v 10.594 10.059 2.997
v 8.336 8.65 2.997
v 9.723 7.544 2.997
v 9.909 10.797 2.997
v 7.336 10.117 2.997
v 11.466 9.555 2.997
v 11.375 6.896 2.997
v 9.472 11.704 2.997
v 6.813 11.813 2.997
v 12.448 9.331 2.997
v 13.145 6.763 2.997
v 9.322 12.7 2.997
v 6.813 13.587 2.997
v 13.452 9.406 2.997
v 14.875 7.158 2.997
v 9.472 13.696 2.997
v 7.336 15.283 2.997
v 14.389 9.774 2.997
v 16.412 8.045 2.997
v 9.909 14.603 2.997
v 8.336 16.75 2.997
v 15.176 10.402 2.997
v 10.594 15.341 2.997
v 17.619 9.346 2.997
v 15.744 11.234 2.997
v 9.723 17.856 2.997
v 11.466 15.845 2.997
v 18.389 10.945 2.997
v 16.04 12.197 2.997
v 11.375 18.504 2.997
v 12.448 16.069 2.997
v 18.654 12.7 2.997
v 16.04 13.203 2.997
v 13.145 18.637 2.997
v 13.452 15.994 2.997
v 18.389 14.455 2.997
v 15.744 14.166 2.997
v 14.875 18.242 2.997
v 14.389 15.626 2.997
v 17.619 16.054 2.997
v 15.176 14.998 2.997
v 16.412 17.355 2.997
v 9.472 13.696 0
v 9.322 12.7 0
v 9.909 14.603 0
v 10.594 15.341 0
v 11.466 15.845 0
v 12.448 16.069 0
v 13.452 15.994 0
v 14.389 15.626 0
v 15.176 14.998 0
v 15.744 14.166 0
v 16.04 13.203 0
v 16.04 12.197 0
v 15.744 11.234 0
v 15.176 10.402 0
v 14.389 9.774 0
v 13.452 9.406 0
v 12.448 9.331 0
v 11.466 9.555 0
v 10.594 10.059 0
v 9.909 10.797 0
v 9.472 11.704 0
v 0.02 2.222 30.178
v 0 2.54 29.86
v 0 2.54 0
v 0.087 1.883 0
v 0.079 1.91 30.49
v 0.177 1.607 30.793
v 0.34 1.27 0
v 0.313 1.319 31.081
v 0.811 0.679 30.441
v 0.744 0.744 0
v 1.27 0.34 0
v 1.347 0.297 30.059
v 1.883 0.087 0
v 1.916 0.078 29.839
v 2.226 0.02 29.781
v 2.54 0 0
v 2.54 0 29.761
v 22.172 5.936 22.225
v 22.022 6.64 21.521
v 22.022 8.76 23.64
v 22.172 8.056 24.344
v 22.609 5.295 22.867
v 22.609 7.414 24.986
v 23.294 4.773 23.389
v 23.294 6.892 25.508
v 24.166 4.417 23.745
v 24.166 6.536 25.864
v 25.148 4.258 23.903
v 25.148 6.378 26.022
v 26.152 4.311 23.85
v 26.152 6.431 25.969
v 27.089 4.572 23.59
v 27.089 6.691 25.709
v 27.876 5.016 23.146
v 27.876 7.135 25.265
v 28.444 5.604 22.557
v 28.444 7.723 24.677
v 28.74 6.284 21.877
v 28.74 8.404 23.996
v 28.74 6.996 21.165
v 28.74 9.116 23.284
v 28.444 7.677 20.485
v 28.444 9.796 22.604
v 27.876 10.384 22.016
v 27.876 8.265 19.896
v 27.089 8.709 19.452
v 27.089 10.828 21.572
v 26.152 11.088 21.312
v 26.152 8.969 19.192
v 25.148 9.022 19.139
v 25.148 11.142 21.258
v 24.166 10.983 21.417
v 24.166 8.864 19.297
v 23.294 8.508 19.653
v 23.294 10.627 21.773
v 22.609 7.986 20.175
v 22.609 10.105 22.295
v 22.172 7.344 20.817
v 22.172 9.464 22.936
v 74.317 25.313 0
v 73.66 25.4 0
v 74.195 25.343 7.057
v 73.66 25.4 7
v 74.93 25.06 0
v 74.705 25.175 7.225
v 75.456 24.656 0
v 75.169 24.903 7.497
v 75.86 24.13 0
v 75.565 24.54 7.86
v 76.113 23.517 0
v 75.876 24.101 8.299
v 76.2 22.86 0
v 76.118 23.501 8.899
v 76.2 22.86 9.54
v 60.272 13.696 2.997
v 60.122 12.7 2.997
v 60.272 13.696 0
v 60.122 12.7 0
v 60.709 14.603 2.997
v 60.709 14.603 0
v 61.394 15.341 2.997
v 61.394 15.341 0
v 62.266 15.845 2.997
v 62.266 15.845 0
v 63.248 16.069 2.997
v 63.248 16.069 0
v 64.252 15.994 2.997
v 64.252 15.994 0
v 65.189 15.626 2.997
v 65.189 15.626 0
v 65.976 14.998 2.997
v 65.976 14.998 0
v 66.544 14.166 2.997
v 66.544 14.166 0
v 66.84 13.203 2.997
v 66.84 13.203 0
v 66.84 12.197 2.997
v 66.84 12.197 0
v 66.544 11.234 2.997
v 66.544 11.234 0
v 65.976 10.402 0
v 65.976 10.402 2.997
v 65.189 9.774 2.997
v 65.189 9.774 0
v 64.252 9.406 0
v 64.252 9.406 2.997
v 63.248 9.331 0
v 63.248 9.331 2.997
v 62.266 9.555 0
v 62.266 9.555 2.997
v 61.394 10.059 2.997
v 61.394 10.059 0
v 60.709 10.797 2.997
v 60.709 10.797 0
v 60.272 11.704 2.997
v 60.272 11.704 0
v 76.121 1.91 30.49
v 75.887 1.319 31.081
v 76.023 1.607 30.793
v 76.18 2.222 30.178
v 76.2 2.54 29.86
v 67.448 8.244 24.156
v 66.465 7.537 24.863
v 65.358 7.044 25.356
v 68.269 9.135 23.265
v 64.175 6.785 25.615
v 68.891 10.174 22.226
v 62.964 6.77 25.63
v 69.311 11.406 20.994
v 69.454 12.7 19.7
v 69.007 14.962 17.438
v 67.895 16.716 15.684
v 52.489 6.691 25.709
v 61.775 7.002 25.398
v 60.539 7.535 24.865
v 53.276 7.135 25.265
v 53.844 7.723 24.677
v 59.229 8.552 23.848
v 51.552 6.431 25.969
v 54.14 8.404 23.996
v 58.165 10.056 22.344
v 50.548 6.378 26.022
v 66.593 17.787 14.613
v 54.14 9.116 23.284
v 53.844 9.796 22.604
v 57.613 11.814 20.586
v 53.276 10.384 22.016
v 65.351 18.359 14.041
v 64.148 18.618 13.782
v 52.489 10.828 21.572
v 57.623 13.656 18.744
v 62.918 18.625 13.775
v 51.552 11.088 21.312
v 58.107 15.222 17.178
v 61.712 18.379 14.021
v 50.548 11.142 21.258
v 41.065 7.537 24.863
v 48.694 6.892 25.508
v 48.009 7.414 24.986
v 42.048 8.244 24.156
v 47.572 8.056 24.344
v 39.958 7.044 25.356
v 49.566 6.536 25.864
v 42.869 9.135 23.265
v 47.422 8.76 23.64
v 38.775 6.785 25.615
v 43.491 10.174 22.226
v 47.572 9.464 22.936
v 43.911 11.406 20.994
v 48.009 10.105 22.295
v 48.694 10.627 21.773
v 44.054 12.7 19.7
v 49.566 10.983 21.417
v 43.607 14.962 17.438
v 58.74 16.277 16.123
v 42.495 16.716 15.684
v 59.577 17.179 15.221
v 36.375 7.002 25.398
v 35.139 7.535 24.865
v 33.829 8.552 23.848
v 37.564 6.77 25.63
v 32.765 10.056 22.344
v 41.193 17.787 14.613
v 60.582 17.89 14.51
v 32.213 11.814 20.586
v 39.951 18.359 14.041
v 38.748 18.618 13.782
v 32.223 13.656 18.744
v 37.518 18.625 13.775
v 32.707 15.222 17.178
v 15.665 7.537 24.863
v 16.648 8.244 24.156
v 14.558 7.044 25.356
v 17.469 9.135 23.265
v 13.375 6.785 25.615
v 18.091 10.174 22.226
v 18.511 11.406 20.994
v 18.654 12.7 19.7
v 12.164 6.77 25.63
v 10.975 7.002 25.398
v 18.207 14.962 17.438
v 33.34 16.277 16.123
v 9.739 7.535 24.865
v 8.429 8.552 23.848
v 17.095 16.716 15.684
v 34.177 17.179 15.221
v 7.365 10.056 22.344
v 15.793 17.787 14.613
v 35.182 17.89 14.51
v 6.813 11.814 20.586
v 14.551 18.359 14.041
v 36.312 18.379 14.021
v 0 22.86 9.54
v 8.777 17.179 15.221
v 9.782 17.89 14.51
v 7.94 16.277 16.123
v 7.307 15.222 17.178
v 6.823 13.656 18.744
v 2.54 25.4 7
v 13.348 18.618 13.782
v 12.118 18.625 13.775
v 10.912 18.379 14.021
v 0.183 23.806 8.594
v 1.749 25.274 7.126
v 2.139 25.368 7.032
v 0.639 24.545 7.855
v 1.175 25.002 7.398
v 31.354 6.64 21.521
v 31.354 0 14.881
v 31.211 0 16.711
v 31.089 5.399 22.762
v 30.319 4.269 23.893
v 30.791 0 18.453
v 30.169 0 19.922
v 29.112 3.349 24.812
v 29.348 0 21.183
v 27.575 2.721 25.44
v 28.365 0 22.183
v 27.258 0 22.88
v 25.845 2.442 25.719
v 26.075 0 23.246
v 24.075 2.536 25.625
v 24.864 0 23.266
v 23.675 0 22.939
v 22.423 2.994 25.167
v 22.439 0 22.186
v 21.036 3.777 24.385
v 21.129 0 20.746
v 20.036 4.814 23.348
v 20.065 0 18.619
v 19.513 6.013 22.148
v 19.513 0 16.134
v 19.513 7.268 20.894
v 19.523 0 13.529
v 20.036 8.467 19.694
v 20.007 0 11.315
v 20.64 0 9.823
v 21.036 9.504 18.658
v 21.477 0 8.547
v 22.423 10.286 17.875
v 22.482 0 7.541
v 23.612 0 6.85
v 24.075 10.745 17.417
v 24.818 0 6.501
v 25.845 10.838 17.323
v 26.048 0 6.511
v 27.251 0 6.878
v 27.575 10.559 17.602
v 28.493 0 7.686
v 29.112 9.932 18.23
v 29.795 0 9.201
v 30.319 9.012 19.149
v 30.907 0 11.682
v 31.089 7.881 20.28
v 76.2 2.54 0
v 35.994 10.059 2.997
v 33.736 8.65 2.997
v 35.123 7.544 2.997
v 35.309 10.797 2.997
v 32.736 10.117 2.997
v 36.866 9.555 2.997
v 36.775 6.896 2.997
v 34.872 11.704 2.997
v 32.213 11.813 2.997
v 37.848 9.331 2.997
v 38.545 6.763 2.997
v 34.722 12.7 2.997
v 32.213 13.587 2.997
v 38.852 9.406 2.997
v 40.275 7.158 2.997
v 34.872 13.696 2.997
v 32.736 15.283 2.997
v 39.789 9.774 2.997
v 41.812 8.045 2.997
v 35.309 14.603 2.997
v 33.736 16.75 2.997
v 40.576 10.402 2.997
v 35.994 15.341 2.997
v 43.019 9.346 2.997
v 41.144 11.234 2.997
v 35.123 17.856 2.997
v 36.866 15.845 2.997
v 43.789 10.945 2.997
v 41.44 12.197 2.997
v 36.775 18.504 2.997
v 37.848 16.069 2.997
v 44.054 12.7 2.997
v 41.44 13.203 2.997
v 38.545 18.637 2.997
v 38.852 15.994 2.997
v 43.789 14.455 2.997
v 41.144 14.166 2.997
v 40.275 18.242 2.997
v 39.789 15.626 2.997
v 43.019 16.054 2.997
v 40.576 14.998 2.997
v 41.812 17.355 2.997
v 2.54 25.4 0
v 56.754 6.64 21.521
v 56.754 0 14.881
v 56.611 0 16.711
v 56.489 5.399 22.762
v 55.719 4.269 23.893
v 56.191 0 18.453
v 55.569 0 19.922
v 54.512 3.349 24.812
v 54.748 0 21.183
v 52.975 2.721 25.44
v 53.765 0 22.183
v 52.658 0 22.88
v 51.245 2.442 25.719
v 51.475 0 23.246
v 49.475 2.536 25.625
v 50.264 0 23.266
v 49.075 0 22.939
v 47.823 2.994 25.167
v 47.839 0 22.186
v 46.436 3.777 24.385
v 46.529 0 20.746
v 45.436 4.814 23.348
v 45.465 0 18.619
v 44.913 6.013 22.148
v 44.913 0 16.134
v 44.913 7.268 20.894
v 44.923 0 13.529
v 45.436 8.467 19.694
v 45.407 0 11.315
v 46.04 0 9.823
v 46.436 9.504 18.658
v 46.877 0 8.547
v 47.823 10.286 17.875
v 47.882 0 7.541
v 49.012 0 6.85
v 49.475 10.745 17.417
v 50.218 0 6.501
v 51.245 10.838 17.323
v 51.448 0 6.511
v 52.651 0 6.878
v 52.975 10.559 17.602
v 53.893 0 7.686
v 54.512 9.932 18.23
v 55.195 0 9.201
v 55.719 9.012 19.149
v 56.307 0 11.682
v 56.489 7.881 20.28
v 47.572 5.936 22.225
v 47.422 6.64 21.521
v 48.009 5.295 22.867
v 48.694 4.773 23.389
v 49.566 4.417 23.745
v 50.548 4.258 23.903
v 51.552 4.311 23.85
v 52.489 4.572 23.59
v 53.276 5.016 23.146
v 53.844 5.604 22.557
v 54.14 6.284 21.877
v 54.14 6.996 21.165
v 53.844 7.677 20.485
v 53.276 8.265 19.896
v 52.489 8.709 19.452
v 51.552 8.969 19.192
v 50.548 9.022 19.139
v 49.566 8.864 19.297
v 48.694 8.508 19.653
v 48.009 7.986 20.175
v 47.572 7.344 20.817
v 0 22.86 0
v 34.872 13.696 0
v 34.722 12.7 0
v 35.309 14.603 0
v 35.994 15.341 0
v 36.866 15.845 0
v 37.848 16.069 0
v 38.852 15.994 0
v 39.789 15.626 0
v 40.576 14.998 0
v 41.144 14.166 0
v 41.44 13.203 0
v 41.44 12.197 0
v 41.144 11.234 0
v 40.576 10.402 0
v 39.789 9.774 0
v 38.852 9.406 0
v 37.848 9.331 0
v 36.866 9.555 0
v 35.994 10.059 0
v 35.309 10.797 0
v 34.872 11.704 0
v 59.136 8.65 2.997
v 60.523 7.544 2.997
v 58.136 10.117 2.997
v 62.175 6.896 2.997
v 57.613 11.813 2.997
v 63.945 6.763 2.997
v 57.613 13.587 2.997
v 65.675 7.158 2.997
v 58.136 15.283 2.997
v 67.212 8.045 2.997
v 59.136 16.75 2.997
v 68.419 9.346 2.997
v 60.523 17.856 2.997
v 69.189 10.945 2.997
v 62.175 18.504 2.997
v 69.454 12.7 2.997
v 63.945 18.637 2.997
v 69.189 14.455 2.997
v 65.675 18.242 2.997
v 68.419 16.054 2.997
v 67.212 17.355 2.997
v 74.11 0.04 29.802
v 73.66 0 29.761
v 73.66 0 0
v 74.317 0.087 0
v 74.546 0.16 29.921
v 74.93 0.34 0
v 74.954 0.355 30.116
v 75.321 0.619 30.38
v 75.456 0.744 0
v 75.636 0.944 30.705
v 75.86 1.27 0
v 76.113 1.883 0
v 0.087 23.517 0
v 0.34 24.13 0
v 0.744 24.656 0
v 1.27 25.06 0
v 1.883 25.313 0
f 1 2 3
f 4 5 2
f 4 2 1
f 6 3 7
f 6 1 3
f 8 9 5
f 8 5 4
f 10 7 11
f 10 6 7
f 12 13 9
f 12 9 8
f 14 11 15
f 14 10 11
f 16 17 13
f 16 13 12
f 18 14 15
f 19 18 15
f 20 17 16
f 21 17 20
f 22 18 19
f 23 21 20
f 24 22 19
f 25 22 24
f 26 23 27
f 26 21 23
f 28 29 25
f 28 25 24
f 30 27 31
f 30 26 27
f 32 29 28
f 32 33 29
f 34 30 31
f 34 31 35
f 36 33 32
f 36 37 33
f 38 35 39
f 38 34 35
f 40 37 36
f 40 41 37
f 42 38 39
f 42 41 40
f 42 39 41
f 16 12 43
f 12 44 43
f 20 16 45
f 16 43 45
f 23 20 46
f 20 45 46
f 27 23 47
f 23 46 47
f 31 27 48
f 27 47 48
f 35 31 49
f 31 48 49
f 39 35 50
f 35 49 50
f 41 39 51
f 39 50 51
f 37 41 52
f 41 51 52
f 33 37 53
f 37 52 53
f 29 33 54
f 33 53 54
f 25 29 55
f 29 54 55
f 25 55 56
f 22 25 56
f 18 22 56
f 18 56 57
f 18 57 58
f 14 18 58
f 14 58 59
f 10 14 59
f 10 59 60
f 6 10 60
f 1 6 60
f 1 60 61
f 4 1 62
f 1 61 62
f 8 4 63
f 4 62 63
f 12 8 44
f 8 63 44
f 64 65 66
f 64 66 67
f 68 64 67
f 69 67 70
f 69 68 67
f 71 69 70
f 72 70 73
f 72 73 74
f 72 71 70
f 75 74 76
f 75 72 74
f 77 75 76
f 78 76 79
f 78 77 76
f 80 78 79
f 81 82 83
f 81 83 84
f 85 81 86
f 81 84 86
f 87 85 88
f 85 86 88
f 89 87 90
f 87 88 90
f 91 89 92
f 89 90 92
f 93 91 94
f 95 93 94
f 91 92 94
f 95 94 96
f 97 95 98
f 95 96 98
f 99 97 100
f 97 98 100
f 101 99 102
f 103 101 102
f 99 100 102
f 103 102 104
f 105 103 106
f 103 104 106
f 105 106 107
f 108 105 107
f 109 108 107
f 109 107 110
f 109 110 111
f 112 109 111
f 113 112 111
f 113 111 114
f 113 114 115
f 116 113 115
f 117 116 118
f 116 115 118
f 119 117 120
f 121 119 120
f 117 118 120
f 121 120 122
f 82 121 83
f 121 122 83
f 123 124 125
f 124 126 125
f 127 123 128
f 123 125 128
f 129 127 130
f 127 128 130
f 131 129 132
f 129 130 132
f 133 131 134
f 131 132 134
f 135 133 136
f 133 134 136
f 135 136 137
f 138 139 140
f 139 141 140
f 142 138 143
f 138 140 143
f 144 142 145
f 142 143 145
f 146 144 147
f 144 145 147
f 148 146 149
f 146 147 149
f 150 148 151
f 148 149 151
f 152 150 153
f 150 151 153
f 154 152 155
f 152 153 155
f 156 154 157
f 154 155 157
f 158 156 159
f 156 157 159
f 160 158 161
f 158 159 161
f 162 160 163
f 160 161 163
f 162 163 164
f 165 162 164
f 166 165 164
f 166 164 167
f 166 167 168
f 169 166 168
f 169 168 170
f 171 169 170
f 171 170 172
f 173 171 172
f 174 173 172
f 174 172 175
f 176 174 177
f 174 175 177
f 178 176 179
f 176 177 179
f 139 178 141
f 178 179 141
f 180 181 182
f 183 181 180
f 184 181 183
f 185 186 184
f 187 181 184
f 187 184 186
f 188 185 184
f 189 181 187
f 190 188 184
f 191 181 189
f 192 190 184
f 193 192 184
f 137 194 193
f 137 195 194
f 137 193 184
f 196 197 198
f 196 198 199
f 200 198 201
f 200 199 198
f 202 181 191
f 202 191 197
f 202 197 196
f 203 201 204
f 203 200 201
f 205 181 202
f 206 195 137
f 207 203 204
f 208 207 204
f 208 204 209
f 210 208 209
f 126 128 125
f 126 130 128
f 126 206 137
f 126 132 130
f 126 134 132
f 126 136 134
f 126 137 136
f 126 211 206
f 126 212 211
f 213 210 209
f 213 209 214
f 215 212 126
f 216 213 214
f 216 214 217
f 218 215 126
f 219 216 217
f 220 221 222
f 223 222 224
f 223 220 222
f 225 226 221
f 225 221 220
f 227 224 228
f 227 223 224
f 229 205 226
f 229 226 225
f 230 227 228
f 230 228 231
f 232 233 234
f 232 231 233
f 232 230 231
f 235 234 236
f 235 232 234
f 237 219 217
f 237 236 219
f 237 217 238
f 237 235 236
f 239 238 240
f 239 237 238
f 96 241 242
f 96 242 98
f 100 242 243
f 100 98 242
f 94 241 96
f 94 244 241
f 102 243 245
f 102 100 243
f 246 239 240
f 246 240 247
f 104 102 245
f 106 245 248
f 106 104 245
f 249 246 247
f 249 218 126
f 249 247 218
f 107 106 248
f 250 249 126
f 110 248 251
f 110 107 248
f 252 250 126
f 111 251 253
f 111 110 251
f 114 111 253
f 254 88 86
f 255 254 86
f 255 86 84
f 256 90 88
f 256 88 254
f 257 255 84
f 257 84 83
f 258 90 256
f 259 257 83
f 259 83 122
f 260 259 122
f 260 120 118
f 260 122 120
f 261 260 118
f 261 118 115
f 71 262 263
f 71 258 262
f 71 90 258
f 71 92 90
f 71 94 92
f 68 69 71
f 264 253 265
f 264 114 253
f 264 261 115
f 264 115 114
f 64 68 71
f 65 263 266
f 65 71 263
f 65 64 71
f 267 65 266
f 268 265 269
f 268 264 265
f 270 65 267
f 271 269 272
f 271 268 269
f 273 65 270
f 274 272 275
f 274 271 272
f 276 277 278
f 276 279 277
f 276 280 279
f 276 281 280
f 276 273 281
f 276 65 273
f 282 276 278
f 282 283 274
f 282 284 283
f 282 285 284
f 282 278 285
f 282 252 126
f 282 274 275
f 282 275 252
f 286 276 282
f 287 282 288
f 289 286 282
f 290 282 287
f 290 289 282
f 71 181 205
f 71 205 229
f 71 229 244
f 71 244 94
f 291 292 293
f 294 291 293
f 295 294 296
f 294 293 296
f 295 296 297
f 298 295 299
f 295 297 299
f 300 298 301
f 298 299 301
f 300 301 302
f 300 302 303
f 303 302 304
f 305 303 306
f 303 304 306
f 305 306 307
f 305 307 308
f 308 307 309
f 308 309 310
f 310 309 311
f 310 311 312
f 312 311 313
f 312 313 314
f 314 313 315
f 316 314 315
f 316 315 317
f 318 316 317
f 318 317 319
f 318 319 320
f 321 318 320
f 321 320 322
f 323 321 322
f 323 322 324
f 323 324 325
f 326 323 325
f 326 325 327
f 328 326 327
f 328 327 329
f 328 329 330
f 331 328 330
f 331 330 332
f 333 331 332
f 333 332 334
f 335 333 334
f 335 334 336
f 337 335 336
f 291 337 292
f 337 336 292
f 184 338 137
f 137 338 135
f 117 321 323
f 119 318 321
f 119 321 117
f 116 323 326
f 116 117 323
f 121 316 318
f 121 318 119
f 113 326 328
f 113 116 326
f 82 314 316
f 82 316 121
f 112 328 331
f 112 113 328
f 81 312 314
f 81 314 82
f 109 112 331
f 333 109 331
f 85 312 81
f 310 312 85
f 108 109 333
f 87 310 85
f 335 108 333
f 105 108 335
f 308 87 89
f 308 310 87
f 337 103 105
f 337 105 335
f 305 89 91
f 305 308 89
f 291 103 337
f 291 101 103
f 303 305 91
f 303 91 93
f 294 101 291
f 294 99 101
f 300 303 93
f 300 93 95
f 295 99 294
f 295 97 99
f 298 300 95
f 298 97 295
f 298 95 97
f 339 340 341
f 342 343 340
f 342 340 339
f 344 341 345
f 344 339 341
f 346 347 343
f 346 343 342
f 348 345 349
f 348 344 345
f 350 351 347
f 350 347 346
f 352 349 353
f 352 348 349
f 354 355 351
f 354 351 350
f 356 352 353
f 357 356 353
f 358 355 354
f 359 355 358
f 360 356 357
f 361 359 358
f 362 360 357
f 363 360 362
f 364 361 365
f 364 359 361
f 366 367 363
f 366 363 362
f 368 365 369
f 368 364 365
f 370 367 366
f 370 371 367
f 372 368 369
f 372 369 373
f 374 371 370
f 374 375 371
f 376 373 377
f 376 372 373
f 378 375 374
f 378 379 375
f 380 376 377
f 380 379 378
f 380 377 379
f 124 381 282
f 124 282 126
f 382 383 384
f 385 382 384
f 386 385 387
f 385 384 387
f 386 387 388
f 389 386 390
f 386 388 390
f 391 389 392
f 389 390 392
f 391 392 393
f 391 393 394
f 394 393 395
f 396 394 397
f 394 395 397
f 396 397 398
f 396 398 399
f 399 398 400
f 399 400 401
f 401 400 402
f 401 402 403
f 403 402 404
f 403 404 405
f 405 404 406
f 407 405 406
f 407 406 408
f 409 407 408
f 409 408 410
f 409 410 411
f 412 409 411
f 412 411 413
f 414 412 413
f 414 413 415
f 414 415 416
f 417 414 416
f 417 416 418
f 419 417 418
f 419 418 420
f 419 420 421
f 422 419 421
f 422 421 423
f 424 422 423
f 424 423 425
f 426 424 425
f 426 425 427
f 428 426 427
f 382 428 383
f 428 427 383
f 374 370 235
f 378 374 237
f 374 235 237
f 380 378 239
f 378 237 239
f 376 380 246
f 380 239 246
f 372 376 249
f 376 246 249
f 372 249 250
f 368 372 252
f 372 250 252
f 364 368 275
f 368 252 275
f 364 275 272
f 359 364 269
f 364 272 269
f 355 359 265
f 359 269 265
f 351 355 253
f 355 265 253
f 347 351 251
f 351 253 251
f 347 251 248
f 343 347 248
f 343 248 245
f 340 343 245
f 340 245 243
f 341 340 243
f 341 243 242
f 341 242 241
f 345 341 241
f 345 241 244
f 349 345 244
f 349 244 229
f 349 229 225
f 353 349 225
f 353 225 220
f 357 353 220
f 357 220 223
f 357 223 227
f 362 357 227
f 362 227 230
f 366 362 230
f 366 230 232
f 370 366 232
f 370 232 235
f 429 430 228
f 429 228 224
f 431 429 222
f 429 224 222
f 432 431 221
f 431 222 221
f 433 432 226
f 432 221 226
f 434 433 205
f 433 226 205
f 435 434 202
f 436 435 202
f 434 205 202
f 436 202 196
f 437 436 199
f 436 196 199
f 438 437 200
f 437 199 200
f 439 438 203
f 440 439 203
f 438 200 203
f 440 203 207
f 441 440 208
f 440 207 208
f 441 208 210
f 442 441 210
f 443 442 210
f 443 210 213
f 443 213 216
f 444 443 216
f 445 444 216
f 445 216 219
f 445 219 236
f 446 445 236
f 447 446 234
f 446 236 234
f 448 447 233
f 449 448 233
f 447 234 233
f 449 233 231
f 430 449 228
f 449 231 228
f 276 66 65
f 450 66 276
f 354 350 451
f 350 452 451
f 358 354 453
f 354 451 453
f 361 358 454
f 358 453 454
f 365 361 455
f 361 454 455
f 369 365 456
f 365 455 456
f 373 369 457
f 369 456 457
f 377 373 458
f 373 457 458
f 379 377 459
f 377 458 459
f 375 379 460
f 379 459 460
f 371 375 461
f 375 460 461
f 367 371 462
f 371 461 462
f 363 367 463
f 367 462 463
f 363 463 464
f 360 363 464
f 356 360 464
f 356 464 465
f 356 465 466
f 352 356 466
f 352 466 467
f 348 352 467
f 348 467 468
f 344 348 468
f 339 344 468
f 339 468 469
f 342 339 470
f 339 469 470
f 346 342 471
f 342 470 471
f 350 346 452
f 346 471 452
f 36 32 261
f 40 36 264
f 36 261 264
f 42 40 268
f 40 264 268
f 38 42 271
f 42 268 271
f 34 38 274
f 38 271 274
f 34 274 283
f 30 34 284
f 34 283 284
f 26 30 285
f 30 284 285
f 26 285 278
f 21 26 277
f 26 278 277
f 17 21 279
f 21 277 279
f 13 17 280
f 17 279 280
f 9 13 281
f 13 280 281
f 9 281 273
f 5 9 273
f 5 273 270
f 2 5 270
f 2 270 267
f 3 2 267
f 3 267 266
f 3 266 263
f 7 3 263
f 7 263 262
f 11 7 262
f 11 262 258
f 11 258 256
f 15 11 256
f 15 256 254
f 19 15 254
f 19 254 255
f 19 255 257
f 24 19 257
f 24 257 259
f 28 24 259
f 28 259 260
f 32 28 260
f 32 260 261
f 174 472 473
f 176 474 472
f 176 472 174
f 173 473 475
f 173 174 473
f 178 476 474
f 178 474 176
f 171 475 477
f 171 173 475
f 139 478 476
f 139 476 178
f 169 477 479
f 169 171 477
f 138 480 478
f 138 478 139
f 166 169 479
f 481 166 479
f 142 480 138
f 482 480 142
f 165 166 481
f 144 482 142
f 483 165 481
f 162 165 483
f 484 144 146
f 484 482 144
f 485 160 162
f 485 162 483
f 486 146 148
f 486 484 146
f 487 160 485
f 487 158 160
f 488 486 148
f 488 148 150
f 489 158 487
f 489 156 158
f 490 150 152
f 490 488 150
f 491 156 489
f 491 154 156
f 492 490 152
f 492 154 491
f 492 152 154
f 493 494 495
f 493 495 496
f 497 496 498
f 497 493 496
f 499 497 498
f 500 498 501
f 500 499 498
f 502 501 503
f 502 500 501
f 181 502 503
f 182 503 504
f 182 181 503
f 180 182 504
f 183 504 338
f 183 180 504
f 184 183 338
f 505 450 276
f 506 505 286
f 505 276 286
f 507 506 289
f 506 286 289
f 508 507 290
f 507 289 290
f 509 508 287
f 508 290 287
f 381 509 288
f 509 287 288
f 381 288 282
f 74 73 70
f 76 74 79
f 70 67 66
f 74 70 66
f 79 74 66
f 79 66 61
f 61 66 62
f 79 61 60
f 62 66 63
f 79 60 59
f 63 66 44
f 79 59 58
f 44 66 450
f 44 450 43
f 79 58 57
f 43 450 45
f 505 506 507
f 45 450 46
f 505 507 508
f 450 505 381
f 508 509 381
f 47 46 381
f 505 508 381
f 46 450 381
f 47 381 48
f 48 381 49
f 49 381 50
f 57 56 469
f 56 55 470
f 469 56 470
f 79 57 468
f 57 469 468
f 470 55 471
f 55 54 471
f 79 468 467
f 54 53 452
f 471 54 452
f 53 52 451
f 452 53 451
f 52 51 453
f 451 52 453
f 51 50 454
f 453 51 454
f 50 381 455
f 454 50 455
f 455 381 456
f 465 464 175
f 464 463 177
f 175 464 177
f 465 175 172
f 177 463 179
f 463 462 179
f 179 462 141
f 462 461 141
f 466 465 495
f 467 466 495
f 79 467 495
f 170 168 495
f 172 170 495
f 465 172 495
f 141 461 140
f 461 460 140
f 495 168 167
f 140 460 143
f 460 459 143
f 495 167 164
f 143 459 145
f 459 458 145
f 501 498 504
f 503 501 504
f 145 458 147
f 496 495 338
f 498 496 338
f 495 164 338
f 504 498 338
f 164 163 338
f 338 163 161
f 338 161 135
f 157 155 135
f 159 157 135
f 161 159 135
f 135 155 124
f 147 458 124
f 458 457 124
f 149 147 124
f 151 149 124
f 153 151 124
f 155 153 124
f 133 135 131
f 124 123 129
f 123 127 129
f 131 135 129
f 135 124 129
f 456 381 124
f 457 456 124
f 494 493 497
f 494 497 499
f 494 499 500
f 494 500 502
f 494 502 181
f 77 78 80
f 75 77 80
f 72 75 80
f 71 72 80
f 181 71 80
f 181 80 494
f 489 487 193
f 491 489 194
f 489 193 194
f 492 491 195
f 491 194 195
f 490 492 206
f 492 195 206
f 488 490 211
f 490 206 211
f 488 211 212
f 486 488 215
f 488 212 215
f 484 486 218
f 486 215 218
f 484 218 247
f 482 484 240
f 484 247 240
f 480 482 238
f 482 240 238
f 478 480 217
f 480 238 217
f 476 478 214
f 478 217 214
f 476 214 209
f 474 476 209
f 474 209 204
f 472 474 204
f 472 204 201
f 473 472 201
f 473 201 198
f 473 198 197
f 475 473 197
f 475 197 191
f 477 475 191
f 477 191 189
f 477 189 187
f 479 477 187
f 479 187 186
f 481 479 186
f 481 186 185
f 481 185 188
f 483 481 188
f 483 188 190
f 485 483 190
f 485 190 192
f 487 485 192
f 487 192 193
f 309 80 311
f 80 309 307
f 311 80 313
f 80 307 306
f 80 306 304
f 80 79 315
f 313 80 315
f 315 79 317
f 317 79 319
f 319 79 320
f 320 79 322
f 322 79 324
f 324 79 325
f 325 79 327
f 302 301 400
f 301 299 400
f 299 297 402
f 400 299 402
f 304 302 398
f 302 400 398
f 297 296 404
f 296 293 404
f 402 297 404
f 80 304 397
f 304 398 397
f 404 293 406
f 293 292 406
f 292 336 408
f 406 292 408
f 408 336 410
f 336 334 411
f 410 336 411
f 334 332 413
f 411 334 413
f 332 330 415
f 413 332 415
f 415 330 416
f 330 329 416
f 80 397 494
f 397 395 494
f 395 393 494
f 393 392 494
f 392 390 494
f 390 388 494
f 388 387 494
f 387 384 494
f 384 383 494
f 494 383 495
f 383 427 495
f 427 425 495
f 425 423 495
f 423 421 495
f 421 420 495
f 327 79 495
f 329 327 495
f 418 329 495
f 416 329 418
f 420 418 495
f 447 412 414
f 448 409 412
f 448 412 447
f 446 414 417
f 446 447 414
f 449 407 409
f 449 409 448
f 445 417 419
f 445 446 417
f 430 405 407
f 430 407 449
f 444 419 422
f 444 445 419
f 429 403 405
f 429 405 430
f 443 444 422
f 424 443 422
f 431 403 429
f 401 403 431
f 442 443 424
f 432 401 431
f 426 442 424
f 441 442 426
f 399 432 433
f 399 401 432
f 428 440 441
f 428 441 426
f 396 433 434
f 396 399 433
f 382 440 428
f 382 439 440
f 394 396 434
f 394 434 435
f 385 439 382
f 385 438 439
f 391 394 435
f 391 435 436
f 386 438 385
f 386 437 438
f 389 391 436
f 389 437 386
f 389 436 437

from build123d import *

# Parameters (mm, degrees)
SKETCH3_W                                        = 76.2
SKETCH3_H                                        = 25.4
BOSS_EXTRUDE1_DEPTH                              = 31.75
CBORE_FOR_1_4_BUTTON_HEAD_CAP_SCREW1_D           = 6.7564
CBORE_FOR_1_4_BUTTON_HEAD_CAP_SCREW1_CBORE_D     = 11.90752
CBORE_FOR_1_4_BUTTON_HEAD_CAP_SCREW1_CBORE_DEPTH = 28.7528
CUT_EXTRUDE1_START                               = -76.2
CUT_EXTRUDE1_DEPTH                               = 76.2
CBORE_FOR_1_4_BUTTON_HEAD_CAP_SCREW2_D           = 6.7564
CBORE_FOR_1_4_BUTTON_HEAD_CAP_SCREW2_CBORE_D     = 11.90752
CBORE_FOR_1_4_BUTTON_HEAD_CAP_SCREW2_CBORE_DEPTH = 22.4028
FILLET1_R                                        = 2.54


# Read off the part's stored shape, not the designer's step: Cut-Extrude1
with BuildPart() as part:
    # Sketch3 → Boss-Extrude1 (new body)
    with BuildSketch(Plane.XY):
        with Locations((38.1, 12.7)):
            Rectangle(SKETCH3_W, SKETCH3_H)
    extrude(amount=BOSS_EXTRUDE1_DEPTH)

    # CBORE for 1/4 Button Head Cap Screw1 (through all)
    with Locations(Plane.XY.offset(31.75)):
        with Locations((12.7, 12.7), (38.1, 12.7), (63.5, 12.7)):
            CounterBoreHole(CBORE_FOR_1_4_BUTTON_HEAD_CAP_SCREW1_D / 2, CBORE_FOR_1_4_BUTTON_HEAD_CAP_SCREW1_CBORE_D / 2, CBORE_FOR_1_4_BUTTON_HEAD_CAP_SCREW1_CBORE_DEPTH)

    # Cut-Extrude1 outline → Cut-Extrude1 (cut)
    with BuildSketch(Plane(origin=(76.2, 0, 0), x_dir=(0, 0, -1), z_dir=(1, 0, 0)).offset(CUT_EXTRUDE1_START)):
        Polygon((-31.75, 0), (-29.761484683, 0), (-31.080742341, 1.319257659), (-7, 25.4), (-31.75, 25.4), align=None)
    extrude(amount=CUT_EXTRUDE1_DEPTH, mode=Mode.SUBTRACT)

    # CBORE for 1/4 Button Head Cap Screw2 (through all)
    with Locations(Plane(origin=(0, -1.760512242, -1.760512242), x_dir=(1, 0, 0), z_dir=(0, -0.7071067811865437, -0.7071067811865513))):
        with Locations((25.4, 10.522273819), (50.8, 10.522273819)):
            CounterBoreHole(CBORE_FOR_1_4_BUTTON_HEAD_CAP_SCREW2_D / 2, CBORE_FOR_1_4_BUTTON_HEAD_CAP_SCREW2_CBORE_D / 2, CBORE_FOR_1_4_BUTTON_HEAD_CAP_SCREW2_CBORE_DEPTH)

    # Fillet1
    fillet1_edges = [part.edges().sort_by_distance(p)[0] for p in [
        (0, 0, 14.880742341),
        (0, 25.4, 3.5),
        (76.2, 25.4, 3.5),
        (76.2, 0, 14.880742341),
    ]]
    fillet(fillet1_edges, radius=FILLET1_R)


solid = part.part
